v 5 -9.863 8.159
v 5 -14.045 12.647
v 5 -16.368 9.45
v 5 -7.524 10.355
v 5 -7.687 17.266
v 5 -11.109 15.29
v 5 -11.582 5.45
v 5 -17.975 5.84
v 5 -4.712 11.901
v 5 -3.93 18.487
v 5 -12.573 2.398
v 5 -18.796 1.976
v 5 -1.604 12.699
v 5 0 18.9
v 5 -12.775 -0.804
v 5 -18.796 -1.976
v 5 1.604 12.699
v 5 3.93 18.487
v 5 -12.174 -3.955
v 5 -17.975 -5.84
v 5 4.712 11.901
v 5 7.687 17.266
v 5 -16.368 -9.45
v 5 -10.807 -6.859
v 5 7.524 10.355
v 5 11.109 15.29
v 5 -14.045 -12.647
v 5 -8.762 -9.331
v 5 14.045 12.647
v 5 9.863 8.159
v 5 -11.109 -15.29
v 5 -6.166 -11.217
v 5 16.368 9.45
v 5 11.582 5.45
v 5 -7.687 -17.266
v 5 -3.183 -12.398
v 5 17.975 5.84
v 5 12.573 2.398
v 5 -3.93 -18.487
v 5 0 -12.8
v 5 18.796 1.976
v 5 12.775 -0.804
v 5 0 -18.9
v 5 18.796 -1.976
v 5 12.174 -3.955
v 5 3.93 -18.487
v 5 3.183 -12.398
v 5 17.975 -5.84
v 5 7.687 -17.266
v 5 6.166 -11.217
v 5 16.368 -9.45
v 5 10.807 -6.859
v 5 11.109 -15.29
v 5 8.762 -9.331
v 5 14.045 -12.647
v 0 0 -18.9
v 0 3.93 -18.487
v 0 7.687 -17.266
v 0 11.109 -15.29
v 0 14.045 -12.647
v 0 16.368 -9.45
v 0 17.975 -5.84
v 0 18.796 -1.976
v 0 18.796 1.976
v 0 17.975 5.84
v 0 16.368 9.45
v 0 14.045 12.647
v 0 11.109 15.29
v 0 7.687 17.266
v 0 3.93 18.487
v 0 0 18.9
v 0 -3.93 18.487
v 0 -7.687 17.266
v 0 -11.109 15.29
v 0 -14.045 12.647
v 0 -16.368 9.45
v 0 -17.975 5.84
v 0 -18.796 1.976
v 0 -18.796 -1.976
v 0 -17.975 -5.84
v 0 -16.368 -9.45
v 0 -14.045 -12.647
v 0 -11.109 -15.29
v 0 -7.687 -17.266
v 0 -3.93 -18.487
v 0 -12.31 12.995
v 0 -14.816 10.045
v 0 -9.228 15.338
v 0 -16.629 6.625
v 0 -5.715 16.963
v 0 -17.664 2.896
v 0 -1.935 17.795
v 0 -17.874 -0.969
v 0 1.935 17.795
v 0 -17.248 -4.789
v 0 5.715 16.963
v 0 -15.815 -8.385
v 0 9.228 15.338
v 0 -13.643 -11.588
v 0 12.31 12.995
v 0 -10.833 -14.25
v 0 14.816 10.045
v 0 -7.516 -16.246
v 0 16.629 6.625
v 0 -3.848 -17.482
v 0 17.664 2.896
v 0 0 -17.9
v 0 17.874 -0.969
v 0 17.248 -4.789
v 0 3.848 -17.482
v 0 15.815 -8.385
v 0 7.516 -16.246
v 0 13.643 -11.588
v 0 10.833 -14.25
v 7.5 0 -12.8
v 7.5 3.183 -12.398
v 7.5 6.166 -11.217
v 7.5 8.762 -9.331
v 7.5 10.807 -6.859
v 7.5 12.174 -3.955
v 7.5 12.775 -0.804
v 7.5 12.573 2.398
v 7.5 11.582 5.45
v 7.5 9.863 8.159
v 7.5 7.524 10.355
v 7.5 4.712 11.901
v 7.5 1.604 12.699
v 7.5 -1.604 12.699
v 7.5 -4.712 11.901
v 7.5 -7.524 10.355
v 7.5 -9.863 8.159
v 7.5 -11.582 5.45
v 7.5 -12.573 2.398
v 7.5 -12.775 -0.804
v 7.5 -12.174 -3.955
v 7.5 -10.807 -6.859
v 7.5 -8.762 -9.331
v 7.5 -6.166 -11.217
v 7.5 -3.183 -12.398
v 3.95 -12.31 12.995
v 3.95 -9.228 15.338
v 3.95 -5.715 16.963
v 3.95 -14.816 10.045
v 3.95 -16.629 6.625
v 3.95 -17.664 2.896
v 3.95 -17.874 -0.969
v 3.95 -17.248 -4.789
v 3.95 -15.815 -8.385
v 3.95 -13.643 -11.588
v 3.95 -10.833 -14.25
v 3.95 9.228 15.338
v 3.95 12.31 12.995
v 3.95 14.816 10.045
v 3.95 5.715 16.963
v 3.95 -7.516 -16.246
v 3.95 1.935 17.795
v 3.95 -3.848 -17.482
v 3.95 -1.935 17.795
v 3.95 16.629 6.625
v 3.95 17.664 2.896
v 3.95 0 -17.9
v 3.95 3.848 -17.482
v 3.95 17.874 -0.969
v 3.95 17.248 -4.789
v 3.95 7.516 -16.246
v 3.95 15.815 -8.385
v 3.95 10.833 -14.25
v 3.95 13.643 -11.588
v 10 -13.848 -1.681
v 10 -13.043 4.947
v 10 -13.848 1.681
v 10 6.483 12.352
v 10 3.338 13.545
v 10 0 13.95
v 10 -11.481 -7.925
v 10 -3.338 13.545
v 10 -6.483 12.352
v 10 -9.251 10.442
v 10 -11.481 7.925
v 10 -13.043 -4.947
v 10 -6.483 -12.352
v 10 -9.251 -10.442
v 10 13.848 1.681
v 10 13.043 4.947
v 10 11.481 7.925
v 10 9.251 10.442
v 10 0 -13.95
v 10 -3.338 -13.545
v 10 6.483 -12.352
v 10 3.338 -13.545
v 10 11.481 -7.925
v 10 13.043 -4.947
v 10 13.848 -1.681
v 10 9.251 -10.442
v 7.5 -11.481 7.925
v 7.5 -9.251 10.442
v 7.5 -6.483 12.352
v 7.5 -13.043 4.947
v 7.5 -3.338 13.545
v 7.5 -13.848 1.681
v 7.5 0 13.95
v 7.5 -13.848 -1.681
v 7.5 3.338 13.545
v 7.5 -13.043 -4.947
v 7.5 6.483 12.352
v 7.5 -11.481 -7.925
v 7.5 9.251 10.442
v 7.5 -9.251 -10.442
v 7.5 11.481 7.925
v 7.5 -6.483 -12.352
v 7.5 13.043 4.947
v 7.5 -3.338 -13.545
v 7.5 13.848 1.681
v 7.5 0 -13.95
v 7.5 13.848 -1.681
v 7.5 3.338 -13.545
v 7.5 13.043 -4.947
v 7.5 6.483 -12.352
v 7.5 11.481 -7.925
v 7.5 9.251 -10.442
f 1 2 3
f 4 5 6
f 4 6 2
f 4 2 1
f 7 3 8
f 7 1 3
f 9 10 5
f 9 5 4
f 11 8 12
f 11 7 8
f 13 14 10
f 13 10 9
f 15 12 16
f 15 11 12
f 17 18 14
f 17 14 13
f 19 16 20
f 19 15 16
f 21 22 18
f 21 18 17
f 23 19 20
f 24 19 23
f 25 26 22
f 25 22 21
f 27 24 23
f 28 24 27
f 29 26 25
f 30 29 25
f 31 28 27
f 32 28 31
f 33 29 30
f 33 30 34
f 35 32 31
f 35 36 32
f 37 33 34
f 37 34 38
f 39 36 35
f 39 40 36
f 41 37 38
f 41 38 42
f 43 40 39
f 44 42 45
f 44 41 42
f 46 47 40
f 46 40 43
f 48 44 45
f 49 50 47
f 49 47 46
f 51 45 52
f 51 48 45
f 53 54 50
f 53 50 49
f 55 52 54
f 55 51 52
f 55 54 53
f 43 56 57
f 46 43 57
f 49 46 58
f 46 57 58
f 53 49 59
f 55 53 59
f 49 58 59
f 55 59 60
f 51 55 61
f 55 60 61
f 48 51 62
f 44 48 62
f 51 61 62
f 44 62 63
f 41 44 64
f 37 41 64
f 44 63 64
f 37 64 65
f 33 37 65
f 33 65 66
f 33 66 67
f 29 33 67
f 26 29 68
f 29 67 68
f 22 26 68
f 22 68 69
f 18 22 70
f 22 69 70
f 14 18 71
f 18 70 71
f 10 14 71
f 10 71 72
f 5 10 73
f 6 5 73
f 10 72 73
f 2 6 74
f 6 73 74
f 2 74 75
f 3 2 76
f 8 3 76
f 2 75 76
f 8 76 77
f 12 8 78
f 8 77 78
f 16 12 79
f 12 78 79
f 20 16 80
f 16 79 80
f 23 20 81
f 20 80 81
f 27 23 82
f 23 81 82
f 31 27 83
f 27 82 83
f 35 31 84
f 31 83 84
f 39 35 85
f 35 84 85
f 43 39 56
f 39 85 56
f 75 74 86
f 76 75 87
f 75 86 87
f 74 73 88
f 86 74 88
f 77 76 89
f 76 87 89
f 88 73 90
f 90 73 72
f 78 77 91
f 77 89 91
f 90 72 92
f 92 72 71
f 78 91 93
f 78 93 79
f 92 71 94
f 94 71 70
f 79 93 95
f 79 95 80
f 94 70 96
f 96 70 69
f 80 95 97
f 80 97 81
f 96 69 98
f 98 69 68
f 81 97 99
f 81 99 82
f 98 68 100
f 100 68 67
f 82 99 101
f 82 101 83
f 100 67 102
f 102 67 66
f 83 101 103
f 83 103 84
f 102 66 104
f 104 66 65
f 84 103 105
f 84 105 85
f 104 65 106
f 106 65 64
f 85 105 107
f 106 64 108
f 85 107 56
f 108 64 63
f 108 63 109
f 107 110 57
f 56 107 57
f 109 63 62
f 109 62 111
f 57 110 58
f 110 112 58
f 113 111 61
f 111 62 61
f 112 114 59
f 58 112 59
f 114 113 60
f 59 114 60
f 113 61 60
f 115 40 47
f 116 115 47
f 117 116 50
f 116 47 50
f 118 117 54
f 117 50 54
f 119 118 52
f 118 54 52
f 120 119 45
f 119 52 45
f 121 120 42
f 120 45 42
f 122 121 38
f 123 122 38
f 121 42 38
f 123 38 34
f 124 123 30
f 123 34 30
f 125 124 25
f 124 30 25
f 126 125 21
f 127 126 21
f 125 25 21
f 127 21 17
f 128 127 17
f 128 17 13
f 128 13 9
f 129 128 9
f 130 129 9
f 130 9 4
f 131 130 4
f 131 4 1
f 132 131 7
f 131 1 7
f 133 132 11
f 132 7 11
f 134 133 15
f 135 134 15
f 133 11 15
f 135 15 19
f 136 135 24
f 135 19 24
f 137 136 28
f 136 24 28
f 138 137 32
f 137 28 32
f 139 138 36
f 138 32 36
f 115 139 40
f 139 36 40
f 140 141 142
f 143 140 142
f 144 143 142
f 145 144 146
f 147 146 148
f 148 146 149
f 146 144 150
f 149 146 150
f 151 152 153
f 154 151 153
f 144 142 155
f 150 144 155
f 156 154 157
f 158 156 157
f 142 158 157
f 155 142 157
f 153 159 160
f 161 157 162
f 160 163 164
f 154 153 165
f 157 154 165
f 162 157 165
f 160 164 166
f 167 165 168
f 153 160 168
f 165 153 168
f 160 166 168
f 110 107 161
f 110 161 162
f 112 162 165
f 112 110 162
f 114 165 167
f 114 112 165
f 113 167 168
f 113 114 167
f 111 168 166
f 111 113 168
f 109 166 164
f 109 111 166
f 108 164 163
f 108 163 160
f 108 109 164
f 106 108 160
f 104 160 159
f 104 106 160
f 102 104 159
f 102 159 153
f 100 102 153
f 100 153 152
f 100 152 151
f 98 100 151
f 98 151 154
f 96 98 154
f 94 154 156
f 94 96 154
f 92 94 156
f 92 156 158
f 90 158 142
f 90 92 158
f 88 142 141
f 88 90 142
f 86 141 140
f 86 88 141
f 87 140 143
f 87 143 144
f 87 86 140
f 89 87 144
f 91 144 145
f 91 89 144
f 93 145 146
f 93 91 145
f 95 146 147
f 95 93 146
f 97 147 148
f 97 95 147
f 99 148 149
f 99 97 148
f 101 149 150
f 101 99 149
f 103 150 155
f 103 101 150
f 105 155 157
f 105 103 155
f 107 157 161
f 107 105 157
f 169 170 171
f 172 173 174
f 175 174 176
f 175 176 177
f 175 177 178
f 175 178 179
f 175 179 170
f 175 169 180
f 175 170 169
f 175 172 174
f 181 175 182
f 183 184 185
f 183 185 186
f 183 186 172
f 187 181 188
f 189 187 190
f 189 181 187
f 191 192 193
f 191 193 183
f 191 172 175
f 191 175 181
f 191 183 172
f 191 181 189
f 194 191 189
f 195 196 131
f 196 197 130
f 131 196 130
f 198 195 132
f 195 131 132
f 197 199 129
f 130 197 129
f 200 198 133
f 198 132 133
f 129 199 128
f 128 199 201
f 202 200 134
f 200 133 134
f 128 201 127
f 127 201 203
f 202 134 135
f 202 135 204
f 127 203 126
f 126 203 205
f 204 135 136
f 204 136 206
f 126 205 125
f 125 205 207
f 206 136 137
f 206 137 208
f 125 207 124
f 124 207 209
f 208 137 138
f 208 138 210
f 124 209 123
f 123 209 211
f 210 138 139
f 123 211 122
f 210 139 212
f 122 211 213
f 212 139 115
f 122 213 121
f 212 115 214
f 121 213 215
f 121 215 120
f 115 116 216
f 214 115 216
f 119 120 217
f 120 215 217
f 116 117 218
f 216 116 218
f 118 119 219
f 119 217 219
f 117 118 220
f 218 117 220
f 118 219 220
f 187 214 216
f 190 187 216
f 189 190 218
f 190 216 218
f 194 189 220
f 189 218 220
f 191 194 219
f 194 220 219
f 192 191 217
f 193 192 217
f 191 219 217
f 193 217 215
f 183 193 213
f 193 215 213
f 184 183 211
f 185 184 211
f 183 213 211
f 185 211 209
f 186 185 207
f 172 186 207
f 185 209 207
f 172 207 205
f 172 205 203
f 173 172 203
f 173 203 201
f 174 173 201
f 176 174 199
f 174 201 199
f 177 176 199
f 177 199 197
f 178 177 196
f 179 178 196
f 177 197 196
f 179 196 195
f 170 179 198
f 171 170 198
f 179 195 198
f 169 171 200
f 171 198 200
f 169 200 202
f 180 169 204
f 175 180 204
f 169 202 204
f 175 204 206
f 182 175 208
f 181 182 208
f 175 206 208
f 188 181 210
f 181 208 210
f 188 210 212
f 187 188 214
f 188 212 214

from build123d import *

# Parameters (mm, degrees)
SKETCH2_R           = 18.9
BOSS_EXTRUDE1_DEPTH = 5
SKETCH2_4_R         = 17.9
CUT_EXTRUDE1_DEPTH  = 3.95
SKETCH7_R           = 12.8
BOSS_EXTRUDE2_DEPTH = 2.5
SKETCH8_R           = 13.95
BOSS_EXTRUDE3_DEPTH = 2.5


with BuildPart() as part:
    # Sketch2 → Boss-Extrude1 (new body)
    with BuildSketch(Plane(origin=(0, 0, 0), x_dir=(0, 0, -1), z_dir=(1, 0, 0))):
        Circle(SKETCH2_R)
    extrude(amount=BOSS_EXTRUDE1_DEPTH)

    # Sketch2<4> → Cut-Extrude1 (cut)
    with BuildSketch(Plane(origin=(0, 0, 0), x_dir=(0, 0, -1), z_dir=(1, 0, 0))):
        Circle(SKETCH2_4_R)
    extrude(amount=CUT_EXTRUDE1_DEPTH, mode=Mode.SUBTRACT)

    # Sketch7 → Boss-Extrude2 (add)
    with BuildSketch(Plane(origin=(5, 0, 0), x_dir=(0, 0, -1), z_dir=(1, 0, 0))):
        Circle(SKETCH7_R)
    extrude(amount=BOSS_EXTRUDE2_DEPTH)

    # Sketch8 → Boss-Extrude3 (add)
    with BuildSketch(Plane(origin=(7.5, 0, 0), x_dir=(0, 0, -1), z_dir=(1, 0, 0))):
        Circle(SKETCH8_R)
    extrude(amount=BOSS_EXTRUDE3_DEPTH)


solid = part.part
